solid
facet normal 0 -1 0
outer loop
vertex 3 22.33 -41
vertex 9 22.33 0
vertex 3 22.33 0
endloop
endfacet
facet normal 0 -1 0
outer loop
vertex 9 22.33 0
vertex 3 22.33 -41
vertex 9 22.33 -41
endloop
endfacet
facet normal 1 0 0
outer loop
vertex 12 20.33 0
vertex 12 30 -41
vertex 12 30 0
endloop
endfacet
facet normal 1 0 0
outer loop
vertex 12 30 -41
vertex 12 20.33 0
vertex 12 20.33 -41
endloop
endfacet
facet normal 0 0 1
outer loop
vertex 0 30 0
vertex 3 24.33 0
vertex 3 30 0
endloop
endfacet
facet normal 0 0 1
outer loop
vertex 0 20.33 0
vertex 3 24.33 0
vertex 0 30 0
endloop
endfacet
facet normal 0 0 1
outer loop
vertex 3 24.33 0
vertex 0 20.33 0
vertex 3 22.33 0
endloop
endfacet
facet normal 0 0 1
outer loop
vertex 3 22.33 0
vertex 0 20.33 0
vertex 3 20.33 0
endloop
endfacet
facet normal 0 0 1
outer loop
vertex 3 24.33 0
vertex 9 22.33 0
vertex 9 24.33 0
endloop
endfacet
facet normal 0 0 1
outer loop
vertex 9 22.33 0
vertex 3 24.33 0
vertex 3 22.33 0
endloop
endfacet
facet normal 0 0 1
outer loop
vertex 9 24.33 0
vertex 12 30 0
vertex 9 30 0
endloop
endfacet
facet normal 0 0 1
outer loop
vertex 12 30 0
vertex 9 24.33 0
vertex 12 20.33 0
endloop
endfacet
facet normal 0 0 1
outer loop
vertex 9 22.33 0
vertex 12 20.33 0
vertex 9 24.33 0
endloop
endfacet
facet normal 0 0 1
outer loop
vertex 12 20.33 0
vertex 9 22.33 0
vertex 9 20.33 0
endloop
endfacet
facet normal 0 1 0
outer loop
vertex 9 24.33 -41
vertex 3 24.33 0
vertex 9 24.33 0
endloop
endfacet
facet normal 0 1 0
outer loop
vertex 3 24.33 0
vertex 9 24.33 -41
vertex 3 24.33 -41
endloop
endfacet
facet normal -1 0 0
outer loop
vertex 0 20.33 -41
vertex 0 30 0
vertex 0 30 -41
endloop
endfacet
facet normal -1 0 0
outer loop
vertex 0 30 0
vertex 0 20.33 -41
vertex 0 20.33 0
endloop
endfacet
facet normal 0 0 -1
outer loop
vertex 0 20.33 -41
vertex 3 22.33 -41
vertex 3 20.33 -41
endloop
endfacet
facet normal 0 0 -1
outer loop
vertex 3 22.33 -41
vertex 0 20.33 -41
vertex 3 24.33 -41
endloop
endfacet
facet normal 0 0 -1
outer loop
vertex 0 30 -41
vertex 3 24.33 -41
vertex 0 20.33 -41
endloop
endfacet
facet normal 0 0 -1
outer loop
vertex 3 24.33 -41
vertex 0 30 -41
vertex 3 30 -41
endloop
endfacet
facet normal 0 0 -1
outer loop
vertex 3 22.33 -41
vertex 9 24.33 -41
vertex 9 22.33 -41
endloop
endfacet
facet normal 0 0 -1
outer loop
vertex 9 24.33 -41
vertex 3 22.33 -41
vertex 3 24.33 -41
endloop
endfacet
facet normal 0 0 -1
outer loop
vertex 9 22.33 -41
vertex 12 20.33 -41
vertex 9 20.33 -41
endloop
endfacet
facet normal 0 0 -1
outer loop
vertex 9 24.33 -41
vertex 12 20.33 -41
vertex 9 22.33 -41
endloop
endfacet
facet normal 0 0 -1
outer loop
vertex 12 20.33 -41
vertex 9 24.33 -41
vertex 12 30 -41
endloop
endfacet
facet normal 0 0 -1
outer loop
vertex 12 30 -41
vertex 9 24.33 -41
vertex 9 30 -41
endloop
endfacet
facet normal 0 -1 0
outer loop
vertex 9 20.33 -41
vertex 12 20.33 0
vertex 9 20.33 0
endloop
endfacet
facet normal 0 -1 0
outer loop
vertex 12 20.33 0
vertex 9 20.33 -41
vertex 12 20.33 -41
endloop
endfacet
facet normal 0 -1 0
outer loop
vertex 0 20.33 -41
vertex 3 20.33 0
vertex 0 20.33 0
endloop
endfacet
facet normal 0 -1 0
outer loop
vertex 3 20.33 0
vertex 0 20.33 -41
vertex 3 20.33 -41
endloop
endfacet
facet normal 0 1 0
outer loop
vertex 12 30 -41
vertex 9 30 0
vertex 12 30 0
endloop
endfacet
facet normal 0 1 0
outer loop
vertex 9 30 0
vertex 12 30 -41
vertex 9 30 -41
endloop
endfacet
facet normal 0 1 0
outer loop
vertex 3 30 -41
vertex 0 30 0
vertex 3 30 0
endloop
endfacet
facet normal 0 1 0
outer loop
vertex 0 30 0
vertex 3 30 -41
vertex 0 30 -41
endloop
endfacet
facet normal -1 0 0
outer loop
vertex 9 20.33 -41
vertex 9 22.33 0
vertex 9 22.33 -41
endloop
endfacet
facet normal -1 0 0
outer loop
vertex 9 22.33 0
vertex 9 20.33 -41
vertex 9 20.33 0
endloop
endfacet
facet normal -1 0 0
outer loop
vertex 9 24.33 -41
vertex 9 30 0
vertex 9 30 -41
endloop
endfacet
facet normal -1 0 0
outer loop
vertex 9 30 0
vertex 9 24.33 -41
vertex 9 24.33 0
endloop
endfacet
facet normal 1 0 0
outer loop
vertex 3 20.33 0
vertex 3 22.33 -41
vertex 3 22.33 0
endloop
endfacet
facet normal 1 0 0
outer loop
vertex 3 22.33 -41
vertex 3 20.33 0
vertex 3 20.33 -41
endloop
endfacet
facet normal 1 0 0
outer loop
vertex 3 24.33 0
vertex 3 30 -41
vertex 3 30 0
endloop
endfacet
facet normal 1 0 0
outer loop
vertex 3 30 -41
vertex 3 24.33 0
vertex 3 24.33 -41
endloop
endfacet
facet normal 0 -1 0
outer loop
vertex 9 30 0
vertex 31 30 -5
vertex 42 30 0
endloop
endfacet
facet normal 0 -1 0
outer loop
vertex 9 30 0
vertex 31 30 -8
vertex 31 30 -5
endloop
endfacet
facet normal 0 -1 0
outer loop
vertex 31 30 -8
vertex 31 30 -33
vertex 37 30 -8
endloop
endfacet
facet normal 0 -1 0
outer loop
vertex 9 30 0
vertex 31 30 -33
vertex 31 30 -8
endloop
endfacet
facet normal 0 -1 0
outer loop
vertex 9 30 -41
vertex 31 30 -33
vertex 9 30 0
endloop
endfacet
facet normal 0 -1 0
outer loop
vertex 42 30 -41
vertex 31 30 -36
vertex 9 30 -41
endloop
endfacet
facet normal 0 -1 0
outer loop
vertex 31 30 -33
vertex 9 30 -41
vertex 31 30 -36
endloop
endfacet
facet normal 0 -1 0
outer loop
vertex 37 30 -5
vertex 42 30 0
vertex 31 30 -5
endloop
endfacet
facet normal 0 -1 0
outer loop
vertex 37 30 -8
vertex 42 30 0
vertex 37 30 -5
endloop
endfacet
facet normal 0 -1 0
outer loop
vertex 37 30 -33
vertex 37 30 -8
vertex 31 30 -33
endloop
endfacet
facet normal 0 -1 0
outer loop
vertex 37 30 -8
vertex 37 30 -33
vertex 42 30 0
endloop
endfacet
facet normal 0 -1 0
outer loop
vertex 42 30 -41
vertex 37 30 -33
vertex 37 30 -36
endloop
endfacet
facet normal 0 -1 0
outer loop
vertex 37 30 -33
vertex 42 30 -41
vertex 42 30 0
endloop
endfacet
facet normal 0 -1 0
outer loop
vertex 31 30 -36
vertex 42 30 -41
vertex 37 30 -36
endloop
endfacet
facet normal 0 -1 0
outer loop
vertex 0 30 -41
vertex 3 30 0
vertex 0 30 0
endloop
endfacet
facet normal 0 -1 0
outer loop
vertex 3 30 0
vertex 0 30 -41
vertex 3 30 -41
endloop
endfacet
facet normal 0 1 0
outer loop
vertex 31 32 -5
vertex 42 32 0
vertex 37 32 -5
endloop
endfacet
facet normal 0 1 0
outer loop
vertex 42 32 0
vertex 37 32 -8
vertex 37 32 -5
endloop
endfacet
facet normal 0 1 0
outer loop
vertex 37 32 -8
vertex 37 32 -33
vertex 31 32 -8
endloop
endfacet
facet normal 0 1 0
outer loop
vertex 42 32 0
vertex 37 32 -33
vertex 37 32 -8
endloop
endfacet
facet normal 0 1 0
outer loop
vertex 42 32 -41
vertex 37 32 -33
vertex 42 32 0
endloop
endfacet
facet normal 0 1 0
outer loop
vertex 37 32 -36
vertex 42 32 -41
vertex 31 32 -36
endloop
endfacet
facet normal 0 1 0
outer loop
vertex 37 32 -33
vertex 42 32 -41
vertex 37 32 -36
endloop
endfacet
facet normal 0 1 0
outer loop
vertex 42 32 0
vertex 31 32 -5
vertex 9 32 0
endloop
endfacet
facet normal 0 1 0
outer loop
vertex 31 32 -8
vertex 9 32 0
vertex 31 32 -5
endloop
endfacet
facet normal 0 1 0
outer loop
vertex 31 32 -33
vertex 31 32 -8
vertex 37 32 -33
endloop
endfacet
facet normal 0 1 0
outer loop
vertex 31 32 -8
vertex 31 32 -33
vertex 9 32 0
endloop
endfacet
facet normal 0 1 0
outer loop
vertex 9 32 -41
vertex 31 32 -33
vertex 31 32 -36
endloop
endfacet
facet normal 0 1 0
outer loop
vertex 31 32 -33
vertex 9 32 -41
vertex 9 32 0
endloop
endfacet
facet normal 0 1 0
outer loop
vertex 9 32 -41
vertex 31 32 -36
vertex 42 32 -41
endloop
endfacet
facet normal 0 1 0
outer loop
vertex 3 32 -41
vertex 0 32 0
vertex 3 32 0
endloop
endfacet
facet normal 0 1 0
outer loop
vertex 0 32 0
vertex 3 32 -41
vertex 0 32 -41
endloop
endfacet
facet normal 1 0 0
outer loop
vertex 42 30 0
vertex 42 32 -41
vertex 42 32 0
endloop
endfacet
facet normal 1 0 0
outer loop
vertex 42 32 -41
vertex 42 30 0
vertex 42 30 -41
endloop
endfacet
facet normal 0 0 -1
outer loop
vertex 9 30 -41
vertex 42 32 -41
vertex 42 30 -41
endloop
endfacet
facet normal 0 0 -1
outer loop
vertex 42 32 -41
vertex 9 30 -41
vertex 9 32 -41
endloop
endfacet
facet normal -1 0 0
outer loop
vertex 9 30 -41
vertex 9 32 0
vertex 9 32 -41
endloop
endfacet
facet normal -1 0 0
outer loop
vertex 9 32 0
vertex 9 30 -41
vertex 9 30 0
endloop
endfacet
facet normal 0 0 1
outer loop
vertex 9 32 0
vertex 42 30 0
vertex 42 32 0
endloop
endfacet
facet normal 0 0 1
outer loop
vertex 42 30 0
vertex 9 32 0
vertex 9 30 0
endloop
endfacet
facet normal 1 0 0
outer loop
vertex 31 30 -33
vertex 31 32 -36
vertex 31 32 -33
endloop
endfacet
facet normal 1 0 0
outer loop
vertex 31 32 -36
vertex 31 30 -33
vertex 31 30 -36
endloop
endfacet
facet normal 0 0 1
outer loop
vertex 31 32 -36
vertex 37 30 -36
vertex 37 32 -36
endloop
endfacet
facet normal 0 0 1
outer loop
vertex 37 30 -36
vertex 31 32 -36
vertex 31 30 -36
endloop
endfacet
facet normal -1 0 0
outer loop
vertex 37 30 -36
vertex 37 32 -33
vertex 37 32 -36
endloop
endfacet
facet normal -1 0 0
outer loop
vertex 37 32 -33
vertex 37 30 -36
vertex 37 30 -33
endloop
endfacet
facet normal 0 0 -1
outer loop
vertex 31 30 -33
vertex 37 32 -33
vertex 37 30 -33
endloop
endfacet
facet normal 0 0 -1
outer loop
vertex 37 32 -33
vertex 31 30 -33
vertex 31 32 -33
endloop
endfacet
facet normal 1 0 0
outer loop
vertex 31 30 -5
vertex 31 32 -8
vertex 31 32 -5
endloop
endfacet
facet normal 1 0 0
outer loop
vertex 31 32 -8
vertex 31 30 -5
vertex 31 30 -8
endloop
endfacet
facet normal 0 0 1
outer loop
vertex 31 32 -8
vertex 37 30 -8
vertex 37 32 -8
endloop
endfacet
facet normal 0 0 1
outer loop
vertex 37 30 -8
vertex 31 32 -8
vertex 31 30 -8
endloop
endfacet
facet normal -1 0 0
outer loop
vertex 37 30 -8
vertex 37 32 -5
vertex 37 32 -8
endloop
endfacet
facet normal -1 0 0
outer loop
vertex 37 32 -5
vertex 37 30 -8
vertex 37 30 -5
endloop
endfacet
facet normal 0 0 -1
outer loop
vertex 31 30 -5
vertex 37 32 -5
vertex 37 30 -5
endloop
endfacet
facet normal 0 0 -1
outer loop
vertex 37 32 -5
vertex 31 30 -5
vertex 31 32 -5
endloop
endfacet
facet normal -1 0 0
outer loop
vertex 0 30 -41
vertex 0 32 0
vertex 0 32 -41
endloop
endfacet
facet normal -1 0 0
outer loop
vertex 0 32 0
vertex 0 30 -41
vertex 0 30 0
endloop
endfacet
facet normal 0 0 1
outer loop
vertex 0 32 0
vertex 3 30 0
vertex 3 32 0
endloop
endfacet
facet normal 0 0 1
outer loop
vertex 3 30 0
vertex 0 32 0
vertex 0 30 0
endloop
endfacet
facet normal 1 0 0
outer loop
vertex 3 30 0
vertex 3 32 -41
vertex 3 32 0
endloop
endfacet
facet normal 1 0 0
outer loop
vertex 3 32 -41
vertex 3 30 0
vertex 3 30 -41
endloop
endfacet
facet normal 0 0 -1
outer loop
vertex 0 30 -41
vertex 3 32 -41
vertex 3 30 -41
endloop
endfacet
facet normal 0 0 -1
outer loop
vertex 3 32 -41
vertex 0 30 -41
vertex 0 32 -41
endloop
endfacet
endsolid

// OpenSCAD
// 22.33 = gear rack holder dist from axle
// 30 = plate dist from axle
// 8 = rack notch depth
// 10 = plate padding before screw holes
// 41 = plate
gear_radius = 16.33;
rack_depth = 6;
plate_dist_from_axle=30;
rack_dist_from_axle = gear_radius + rack_depth;
echo("rack dist from axle:", rack_dist_from_axle);

thickness=2;
length=41; // plate length
width=42; // plate width
slit_width = rack_depth;
slit_length = length;
slit_start_x = 3;
slit_end_x = slit_start_x + slit_width;
slit_start_y = 0;
slit_end_y = slit_start_y + slit_length;
slit_cover_width = slit_width + slit_start_x + slit_width/2;
slit_offset = slit_start_x - slit_width/2;
notch_depth = plate_dist_from_axle-rack_dist_from_axle;

base_points = [[0,0],[width,0],[width,length],[0,length]];
slit_points = [
    [slit_start_x,slit_start_y],
    [slit_end_x,slit_start_y],
    [slit_end_x,slit_end_y],
    [slit_start_x,slit_end_y]
];

hole_padding_x = 5;
hole_padding_y = 5;
hole_width = 6;
hole_length = 3;
hole_x = width - hole_padding_x;
hole1_y = length - hole_padding_y;
hole2_y = hole_padding_y;
hole1 = [
    [hole_x-hole_width,hole1_y-hole_length],
    [hole_x,hole1_y-hole_length],
    [hole_x,hole1_y],
    [hole_x-hole_width,hole1_y]
];

hole2 = [
    [hole_x-hole_width,hole2_y+hole_length],
    [hole_x,hole2_y+hole_length],
    [hole_x,hole2_y],
    [hole_x-hole_width,hole2_y]
];

paths = [[0,1,2,3],[4,5,6,7]];
points = concat(
    base_points,
    slit_points,
    hole1,
    hole2
);

base_paths = concat(paths, [[8,9,10,11],[12,13,14,15]]);

translate([0,plate_dist_from_axle,0]) rotate([-90,0,0]) {
    linear_extrude(thickness) polygon(points=points, paths=base_paths, convexity=10);

    notch_outer_points = [
        [slit_offset,0],
        [slit_cover_width,0],
        [slit_cover_width,length],
        [slit_offset,length]
    ];
    notch_points = concat(
        notch_outer_points,
        slit_points
    );
    translate([0,0,-notch_depth]) {
        linear_extrude(thickness) polygon(notch_outer_points, [[0,1,2,3]]);
        translate([0,0,-thickness]) linear_extrude(notch_depth+thickness) polygon(notch_points, paths);
    }
}
